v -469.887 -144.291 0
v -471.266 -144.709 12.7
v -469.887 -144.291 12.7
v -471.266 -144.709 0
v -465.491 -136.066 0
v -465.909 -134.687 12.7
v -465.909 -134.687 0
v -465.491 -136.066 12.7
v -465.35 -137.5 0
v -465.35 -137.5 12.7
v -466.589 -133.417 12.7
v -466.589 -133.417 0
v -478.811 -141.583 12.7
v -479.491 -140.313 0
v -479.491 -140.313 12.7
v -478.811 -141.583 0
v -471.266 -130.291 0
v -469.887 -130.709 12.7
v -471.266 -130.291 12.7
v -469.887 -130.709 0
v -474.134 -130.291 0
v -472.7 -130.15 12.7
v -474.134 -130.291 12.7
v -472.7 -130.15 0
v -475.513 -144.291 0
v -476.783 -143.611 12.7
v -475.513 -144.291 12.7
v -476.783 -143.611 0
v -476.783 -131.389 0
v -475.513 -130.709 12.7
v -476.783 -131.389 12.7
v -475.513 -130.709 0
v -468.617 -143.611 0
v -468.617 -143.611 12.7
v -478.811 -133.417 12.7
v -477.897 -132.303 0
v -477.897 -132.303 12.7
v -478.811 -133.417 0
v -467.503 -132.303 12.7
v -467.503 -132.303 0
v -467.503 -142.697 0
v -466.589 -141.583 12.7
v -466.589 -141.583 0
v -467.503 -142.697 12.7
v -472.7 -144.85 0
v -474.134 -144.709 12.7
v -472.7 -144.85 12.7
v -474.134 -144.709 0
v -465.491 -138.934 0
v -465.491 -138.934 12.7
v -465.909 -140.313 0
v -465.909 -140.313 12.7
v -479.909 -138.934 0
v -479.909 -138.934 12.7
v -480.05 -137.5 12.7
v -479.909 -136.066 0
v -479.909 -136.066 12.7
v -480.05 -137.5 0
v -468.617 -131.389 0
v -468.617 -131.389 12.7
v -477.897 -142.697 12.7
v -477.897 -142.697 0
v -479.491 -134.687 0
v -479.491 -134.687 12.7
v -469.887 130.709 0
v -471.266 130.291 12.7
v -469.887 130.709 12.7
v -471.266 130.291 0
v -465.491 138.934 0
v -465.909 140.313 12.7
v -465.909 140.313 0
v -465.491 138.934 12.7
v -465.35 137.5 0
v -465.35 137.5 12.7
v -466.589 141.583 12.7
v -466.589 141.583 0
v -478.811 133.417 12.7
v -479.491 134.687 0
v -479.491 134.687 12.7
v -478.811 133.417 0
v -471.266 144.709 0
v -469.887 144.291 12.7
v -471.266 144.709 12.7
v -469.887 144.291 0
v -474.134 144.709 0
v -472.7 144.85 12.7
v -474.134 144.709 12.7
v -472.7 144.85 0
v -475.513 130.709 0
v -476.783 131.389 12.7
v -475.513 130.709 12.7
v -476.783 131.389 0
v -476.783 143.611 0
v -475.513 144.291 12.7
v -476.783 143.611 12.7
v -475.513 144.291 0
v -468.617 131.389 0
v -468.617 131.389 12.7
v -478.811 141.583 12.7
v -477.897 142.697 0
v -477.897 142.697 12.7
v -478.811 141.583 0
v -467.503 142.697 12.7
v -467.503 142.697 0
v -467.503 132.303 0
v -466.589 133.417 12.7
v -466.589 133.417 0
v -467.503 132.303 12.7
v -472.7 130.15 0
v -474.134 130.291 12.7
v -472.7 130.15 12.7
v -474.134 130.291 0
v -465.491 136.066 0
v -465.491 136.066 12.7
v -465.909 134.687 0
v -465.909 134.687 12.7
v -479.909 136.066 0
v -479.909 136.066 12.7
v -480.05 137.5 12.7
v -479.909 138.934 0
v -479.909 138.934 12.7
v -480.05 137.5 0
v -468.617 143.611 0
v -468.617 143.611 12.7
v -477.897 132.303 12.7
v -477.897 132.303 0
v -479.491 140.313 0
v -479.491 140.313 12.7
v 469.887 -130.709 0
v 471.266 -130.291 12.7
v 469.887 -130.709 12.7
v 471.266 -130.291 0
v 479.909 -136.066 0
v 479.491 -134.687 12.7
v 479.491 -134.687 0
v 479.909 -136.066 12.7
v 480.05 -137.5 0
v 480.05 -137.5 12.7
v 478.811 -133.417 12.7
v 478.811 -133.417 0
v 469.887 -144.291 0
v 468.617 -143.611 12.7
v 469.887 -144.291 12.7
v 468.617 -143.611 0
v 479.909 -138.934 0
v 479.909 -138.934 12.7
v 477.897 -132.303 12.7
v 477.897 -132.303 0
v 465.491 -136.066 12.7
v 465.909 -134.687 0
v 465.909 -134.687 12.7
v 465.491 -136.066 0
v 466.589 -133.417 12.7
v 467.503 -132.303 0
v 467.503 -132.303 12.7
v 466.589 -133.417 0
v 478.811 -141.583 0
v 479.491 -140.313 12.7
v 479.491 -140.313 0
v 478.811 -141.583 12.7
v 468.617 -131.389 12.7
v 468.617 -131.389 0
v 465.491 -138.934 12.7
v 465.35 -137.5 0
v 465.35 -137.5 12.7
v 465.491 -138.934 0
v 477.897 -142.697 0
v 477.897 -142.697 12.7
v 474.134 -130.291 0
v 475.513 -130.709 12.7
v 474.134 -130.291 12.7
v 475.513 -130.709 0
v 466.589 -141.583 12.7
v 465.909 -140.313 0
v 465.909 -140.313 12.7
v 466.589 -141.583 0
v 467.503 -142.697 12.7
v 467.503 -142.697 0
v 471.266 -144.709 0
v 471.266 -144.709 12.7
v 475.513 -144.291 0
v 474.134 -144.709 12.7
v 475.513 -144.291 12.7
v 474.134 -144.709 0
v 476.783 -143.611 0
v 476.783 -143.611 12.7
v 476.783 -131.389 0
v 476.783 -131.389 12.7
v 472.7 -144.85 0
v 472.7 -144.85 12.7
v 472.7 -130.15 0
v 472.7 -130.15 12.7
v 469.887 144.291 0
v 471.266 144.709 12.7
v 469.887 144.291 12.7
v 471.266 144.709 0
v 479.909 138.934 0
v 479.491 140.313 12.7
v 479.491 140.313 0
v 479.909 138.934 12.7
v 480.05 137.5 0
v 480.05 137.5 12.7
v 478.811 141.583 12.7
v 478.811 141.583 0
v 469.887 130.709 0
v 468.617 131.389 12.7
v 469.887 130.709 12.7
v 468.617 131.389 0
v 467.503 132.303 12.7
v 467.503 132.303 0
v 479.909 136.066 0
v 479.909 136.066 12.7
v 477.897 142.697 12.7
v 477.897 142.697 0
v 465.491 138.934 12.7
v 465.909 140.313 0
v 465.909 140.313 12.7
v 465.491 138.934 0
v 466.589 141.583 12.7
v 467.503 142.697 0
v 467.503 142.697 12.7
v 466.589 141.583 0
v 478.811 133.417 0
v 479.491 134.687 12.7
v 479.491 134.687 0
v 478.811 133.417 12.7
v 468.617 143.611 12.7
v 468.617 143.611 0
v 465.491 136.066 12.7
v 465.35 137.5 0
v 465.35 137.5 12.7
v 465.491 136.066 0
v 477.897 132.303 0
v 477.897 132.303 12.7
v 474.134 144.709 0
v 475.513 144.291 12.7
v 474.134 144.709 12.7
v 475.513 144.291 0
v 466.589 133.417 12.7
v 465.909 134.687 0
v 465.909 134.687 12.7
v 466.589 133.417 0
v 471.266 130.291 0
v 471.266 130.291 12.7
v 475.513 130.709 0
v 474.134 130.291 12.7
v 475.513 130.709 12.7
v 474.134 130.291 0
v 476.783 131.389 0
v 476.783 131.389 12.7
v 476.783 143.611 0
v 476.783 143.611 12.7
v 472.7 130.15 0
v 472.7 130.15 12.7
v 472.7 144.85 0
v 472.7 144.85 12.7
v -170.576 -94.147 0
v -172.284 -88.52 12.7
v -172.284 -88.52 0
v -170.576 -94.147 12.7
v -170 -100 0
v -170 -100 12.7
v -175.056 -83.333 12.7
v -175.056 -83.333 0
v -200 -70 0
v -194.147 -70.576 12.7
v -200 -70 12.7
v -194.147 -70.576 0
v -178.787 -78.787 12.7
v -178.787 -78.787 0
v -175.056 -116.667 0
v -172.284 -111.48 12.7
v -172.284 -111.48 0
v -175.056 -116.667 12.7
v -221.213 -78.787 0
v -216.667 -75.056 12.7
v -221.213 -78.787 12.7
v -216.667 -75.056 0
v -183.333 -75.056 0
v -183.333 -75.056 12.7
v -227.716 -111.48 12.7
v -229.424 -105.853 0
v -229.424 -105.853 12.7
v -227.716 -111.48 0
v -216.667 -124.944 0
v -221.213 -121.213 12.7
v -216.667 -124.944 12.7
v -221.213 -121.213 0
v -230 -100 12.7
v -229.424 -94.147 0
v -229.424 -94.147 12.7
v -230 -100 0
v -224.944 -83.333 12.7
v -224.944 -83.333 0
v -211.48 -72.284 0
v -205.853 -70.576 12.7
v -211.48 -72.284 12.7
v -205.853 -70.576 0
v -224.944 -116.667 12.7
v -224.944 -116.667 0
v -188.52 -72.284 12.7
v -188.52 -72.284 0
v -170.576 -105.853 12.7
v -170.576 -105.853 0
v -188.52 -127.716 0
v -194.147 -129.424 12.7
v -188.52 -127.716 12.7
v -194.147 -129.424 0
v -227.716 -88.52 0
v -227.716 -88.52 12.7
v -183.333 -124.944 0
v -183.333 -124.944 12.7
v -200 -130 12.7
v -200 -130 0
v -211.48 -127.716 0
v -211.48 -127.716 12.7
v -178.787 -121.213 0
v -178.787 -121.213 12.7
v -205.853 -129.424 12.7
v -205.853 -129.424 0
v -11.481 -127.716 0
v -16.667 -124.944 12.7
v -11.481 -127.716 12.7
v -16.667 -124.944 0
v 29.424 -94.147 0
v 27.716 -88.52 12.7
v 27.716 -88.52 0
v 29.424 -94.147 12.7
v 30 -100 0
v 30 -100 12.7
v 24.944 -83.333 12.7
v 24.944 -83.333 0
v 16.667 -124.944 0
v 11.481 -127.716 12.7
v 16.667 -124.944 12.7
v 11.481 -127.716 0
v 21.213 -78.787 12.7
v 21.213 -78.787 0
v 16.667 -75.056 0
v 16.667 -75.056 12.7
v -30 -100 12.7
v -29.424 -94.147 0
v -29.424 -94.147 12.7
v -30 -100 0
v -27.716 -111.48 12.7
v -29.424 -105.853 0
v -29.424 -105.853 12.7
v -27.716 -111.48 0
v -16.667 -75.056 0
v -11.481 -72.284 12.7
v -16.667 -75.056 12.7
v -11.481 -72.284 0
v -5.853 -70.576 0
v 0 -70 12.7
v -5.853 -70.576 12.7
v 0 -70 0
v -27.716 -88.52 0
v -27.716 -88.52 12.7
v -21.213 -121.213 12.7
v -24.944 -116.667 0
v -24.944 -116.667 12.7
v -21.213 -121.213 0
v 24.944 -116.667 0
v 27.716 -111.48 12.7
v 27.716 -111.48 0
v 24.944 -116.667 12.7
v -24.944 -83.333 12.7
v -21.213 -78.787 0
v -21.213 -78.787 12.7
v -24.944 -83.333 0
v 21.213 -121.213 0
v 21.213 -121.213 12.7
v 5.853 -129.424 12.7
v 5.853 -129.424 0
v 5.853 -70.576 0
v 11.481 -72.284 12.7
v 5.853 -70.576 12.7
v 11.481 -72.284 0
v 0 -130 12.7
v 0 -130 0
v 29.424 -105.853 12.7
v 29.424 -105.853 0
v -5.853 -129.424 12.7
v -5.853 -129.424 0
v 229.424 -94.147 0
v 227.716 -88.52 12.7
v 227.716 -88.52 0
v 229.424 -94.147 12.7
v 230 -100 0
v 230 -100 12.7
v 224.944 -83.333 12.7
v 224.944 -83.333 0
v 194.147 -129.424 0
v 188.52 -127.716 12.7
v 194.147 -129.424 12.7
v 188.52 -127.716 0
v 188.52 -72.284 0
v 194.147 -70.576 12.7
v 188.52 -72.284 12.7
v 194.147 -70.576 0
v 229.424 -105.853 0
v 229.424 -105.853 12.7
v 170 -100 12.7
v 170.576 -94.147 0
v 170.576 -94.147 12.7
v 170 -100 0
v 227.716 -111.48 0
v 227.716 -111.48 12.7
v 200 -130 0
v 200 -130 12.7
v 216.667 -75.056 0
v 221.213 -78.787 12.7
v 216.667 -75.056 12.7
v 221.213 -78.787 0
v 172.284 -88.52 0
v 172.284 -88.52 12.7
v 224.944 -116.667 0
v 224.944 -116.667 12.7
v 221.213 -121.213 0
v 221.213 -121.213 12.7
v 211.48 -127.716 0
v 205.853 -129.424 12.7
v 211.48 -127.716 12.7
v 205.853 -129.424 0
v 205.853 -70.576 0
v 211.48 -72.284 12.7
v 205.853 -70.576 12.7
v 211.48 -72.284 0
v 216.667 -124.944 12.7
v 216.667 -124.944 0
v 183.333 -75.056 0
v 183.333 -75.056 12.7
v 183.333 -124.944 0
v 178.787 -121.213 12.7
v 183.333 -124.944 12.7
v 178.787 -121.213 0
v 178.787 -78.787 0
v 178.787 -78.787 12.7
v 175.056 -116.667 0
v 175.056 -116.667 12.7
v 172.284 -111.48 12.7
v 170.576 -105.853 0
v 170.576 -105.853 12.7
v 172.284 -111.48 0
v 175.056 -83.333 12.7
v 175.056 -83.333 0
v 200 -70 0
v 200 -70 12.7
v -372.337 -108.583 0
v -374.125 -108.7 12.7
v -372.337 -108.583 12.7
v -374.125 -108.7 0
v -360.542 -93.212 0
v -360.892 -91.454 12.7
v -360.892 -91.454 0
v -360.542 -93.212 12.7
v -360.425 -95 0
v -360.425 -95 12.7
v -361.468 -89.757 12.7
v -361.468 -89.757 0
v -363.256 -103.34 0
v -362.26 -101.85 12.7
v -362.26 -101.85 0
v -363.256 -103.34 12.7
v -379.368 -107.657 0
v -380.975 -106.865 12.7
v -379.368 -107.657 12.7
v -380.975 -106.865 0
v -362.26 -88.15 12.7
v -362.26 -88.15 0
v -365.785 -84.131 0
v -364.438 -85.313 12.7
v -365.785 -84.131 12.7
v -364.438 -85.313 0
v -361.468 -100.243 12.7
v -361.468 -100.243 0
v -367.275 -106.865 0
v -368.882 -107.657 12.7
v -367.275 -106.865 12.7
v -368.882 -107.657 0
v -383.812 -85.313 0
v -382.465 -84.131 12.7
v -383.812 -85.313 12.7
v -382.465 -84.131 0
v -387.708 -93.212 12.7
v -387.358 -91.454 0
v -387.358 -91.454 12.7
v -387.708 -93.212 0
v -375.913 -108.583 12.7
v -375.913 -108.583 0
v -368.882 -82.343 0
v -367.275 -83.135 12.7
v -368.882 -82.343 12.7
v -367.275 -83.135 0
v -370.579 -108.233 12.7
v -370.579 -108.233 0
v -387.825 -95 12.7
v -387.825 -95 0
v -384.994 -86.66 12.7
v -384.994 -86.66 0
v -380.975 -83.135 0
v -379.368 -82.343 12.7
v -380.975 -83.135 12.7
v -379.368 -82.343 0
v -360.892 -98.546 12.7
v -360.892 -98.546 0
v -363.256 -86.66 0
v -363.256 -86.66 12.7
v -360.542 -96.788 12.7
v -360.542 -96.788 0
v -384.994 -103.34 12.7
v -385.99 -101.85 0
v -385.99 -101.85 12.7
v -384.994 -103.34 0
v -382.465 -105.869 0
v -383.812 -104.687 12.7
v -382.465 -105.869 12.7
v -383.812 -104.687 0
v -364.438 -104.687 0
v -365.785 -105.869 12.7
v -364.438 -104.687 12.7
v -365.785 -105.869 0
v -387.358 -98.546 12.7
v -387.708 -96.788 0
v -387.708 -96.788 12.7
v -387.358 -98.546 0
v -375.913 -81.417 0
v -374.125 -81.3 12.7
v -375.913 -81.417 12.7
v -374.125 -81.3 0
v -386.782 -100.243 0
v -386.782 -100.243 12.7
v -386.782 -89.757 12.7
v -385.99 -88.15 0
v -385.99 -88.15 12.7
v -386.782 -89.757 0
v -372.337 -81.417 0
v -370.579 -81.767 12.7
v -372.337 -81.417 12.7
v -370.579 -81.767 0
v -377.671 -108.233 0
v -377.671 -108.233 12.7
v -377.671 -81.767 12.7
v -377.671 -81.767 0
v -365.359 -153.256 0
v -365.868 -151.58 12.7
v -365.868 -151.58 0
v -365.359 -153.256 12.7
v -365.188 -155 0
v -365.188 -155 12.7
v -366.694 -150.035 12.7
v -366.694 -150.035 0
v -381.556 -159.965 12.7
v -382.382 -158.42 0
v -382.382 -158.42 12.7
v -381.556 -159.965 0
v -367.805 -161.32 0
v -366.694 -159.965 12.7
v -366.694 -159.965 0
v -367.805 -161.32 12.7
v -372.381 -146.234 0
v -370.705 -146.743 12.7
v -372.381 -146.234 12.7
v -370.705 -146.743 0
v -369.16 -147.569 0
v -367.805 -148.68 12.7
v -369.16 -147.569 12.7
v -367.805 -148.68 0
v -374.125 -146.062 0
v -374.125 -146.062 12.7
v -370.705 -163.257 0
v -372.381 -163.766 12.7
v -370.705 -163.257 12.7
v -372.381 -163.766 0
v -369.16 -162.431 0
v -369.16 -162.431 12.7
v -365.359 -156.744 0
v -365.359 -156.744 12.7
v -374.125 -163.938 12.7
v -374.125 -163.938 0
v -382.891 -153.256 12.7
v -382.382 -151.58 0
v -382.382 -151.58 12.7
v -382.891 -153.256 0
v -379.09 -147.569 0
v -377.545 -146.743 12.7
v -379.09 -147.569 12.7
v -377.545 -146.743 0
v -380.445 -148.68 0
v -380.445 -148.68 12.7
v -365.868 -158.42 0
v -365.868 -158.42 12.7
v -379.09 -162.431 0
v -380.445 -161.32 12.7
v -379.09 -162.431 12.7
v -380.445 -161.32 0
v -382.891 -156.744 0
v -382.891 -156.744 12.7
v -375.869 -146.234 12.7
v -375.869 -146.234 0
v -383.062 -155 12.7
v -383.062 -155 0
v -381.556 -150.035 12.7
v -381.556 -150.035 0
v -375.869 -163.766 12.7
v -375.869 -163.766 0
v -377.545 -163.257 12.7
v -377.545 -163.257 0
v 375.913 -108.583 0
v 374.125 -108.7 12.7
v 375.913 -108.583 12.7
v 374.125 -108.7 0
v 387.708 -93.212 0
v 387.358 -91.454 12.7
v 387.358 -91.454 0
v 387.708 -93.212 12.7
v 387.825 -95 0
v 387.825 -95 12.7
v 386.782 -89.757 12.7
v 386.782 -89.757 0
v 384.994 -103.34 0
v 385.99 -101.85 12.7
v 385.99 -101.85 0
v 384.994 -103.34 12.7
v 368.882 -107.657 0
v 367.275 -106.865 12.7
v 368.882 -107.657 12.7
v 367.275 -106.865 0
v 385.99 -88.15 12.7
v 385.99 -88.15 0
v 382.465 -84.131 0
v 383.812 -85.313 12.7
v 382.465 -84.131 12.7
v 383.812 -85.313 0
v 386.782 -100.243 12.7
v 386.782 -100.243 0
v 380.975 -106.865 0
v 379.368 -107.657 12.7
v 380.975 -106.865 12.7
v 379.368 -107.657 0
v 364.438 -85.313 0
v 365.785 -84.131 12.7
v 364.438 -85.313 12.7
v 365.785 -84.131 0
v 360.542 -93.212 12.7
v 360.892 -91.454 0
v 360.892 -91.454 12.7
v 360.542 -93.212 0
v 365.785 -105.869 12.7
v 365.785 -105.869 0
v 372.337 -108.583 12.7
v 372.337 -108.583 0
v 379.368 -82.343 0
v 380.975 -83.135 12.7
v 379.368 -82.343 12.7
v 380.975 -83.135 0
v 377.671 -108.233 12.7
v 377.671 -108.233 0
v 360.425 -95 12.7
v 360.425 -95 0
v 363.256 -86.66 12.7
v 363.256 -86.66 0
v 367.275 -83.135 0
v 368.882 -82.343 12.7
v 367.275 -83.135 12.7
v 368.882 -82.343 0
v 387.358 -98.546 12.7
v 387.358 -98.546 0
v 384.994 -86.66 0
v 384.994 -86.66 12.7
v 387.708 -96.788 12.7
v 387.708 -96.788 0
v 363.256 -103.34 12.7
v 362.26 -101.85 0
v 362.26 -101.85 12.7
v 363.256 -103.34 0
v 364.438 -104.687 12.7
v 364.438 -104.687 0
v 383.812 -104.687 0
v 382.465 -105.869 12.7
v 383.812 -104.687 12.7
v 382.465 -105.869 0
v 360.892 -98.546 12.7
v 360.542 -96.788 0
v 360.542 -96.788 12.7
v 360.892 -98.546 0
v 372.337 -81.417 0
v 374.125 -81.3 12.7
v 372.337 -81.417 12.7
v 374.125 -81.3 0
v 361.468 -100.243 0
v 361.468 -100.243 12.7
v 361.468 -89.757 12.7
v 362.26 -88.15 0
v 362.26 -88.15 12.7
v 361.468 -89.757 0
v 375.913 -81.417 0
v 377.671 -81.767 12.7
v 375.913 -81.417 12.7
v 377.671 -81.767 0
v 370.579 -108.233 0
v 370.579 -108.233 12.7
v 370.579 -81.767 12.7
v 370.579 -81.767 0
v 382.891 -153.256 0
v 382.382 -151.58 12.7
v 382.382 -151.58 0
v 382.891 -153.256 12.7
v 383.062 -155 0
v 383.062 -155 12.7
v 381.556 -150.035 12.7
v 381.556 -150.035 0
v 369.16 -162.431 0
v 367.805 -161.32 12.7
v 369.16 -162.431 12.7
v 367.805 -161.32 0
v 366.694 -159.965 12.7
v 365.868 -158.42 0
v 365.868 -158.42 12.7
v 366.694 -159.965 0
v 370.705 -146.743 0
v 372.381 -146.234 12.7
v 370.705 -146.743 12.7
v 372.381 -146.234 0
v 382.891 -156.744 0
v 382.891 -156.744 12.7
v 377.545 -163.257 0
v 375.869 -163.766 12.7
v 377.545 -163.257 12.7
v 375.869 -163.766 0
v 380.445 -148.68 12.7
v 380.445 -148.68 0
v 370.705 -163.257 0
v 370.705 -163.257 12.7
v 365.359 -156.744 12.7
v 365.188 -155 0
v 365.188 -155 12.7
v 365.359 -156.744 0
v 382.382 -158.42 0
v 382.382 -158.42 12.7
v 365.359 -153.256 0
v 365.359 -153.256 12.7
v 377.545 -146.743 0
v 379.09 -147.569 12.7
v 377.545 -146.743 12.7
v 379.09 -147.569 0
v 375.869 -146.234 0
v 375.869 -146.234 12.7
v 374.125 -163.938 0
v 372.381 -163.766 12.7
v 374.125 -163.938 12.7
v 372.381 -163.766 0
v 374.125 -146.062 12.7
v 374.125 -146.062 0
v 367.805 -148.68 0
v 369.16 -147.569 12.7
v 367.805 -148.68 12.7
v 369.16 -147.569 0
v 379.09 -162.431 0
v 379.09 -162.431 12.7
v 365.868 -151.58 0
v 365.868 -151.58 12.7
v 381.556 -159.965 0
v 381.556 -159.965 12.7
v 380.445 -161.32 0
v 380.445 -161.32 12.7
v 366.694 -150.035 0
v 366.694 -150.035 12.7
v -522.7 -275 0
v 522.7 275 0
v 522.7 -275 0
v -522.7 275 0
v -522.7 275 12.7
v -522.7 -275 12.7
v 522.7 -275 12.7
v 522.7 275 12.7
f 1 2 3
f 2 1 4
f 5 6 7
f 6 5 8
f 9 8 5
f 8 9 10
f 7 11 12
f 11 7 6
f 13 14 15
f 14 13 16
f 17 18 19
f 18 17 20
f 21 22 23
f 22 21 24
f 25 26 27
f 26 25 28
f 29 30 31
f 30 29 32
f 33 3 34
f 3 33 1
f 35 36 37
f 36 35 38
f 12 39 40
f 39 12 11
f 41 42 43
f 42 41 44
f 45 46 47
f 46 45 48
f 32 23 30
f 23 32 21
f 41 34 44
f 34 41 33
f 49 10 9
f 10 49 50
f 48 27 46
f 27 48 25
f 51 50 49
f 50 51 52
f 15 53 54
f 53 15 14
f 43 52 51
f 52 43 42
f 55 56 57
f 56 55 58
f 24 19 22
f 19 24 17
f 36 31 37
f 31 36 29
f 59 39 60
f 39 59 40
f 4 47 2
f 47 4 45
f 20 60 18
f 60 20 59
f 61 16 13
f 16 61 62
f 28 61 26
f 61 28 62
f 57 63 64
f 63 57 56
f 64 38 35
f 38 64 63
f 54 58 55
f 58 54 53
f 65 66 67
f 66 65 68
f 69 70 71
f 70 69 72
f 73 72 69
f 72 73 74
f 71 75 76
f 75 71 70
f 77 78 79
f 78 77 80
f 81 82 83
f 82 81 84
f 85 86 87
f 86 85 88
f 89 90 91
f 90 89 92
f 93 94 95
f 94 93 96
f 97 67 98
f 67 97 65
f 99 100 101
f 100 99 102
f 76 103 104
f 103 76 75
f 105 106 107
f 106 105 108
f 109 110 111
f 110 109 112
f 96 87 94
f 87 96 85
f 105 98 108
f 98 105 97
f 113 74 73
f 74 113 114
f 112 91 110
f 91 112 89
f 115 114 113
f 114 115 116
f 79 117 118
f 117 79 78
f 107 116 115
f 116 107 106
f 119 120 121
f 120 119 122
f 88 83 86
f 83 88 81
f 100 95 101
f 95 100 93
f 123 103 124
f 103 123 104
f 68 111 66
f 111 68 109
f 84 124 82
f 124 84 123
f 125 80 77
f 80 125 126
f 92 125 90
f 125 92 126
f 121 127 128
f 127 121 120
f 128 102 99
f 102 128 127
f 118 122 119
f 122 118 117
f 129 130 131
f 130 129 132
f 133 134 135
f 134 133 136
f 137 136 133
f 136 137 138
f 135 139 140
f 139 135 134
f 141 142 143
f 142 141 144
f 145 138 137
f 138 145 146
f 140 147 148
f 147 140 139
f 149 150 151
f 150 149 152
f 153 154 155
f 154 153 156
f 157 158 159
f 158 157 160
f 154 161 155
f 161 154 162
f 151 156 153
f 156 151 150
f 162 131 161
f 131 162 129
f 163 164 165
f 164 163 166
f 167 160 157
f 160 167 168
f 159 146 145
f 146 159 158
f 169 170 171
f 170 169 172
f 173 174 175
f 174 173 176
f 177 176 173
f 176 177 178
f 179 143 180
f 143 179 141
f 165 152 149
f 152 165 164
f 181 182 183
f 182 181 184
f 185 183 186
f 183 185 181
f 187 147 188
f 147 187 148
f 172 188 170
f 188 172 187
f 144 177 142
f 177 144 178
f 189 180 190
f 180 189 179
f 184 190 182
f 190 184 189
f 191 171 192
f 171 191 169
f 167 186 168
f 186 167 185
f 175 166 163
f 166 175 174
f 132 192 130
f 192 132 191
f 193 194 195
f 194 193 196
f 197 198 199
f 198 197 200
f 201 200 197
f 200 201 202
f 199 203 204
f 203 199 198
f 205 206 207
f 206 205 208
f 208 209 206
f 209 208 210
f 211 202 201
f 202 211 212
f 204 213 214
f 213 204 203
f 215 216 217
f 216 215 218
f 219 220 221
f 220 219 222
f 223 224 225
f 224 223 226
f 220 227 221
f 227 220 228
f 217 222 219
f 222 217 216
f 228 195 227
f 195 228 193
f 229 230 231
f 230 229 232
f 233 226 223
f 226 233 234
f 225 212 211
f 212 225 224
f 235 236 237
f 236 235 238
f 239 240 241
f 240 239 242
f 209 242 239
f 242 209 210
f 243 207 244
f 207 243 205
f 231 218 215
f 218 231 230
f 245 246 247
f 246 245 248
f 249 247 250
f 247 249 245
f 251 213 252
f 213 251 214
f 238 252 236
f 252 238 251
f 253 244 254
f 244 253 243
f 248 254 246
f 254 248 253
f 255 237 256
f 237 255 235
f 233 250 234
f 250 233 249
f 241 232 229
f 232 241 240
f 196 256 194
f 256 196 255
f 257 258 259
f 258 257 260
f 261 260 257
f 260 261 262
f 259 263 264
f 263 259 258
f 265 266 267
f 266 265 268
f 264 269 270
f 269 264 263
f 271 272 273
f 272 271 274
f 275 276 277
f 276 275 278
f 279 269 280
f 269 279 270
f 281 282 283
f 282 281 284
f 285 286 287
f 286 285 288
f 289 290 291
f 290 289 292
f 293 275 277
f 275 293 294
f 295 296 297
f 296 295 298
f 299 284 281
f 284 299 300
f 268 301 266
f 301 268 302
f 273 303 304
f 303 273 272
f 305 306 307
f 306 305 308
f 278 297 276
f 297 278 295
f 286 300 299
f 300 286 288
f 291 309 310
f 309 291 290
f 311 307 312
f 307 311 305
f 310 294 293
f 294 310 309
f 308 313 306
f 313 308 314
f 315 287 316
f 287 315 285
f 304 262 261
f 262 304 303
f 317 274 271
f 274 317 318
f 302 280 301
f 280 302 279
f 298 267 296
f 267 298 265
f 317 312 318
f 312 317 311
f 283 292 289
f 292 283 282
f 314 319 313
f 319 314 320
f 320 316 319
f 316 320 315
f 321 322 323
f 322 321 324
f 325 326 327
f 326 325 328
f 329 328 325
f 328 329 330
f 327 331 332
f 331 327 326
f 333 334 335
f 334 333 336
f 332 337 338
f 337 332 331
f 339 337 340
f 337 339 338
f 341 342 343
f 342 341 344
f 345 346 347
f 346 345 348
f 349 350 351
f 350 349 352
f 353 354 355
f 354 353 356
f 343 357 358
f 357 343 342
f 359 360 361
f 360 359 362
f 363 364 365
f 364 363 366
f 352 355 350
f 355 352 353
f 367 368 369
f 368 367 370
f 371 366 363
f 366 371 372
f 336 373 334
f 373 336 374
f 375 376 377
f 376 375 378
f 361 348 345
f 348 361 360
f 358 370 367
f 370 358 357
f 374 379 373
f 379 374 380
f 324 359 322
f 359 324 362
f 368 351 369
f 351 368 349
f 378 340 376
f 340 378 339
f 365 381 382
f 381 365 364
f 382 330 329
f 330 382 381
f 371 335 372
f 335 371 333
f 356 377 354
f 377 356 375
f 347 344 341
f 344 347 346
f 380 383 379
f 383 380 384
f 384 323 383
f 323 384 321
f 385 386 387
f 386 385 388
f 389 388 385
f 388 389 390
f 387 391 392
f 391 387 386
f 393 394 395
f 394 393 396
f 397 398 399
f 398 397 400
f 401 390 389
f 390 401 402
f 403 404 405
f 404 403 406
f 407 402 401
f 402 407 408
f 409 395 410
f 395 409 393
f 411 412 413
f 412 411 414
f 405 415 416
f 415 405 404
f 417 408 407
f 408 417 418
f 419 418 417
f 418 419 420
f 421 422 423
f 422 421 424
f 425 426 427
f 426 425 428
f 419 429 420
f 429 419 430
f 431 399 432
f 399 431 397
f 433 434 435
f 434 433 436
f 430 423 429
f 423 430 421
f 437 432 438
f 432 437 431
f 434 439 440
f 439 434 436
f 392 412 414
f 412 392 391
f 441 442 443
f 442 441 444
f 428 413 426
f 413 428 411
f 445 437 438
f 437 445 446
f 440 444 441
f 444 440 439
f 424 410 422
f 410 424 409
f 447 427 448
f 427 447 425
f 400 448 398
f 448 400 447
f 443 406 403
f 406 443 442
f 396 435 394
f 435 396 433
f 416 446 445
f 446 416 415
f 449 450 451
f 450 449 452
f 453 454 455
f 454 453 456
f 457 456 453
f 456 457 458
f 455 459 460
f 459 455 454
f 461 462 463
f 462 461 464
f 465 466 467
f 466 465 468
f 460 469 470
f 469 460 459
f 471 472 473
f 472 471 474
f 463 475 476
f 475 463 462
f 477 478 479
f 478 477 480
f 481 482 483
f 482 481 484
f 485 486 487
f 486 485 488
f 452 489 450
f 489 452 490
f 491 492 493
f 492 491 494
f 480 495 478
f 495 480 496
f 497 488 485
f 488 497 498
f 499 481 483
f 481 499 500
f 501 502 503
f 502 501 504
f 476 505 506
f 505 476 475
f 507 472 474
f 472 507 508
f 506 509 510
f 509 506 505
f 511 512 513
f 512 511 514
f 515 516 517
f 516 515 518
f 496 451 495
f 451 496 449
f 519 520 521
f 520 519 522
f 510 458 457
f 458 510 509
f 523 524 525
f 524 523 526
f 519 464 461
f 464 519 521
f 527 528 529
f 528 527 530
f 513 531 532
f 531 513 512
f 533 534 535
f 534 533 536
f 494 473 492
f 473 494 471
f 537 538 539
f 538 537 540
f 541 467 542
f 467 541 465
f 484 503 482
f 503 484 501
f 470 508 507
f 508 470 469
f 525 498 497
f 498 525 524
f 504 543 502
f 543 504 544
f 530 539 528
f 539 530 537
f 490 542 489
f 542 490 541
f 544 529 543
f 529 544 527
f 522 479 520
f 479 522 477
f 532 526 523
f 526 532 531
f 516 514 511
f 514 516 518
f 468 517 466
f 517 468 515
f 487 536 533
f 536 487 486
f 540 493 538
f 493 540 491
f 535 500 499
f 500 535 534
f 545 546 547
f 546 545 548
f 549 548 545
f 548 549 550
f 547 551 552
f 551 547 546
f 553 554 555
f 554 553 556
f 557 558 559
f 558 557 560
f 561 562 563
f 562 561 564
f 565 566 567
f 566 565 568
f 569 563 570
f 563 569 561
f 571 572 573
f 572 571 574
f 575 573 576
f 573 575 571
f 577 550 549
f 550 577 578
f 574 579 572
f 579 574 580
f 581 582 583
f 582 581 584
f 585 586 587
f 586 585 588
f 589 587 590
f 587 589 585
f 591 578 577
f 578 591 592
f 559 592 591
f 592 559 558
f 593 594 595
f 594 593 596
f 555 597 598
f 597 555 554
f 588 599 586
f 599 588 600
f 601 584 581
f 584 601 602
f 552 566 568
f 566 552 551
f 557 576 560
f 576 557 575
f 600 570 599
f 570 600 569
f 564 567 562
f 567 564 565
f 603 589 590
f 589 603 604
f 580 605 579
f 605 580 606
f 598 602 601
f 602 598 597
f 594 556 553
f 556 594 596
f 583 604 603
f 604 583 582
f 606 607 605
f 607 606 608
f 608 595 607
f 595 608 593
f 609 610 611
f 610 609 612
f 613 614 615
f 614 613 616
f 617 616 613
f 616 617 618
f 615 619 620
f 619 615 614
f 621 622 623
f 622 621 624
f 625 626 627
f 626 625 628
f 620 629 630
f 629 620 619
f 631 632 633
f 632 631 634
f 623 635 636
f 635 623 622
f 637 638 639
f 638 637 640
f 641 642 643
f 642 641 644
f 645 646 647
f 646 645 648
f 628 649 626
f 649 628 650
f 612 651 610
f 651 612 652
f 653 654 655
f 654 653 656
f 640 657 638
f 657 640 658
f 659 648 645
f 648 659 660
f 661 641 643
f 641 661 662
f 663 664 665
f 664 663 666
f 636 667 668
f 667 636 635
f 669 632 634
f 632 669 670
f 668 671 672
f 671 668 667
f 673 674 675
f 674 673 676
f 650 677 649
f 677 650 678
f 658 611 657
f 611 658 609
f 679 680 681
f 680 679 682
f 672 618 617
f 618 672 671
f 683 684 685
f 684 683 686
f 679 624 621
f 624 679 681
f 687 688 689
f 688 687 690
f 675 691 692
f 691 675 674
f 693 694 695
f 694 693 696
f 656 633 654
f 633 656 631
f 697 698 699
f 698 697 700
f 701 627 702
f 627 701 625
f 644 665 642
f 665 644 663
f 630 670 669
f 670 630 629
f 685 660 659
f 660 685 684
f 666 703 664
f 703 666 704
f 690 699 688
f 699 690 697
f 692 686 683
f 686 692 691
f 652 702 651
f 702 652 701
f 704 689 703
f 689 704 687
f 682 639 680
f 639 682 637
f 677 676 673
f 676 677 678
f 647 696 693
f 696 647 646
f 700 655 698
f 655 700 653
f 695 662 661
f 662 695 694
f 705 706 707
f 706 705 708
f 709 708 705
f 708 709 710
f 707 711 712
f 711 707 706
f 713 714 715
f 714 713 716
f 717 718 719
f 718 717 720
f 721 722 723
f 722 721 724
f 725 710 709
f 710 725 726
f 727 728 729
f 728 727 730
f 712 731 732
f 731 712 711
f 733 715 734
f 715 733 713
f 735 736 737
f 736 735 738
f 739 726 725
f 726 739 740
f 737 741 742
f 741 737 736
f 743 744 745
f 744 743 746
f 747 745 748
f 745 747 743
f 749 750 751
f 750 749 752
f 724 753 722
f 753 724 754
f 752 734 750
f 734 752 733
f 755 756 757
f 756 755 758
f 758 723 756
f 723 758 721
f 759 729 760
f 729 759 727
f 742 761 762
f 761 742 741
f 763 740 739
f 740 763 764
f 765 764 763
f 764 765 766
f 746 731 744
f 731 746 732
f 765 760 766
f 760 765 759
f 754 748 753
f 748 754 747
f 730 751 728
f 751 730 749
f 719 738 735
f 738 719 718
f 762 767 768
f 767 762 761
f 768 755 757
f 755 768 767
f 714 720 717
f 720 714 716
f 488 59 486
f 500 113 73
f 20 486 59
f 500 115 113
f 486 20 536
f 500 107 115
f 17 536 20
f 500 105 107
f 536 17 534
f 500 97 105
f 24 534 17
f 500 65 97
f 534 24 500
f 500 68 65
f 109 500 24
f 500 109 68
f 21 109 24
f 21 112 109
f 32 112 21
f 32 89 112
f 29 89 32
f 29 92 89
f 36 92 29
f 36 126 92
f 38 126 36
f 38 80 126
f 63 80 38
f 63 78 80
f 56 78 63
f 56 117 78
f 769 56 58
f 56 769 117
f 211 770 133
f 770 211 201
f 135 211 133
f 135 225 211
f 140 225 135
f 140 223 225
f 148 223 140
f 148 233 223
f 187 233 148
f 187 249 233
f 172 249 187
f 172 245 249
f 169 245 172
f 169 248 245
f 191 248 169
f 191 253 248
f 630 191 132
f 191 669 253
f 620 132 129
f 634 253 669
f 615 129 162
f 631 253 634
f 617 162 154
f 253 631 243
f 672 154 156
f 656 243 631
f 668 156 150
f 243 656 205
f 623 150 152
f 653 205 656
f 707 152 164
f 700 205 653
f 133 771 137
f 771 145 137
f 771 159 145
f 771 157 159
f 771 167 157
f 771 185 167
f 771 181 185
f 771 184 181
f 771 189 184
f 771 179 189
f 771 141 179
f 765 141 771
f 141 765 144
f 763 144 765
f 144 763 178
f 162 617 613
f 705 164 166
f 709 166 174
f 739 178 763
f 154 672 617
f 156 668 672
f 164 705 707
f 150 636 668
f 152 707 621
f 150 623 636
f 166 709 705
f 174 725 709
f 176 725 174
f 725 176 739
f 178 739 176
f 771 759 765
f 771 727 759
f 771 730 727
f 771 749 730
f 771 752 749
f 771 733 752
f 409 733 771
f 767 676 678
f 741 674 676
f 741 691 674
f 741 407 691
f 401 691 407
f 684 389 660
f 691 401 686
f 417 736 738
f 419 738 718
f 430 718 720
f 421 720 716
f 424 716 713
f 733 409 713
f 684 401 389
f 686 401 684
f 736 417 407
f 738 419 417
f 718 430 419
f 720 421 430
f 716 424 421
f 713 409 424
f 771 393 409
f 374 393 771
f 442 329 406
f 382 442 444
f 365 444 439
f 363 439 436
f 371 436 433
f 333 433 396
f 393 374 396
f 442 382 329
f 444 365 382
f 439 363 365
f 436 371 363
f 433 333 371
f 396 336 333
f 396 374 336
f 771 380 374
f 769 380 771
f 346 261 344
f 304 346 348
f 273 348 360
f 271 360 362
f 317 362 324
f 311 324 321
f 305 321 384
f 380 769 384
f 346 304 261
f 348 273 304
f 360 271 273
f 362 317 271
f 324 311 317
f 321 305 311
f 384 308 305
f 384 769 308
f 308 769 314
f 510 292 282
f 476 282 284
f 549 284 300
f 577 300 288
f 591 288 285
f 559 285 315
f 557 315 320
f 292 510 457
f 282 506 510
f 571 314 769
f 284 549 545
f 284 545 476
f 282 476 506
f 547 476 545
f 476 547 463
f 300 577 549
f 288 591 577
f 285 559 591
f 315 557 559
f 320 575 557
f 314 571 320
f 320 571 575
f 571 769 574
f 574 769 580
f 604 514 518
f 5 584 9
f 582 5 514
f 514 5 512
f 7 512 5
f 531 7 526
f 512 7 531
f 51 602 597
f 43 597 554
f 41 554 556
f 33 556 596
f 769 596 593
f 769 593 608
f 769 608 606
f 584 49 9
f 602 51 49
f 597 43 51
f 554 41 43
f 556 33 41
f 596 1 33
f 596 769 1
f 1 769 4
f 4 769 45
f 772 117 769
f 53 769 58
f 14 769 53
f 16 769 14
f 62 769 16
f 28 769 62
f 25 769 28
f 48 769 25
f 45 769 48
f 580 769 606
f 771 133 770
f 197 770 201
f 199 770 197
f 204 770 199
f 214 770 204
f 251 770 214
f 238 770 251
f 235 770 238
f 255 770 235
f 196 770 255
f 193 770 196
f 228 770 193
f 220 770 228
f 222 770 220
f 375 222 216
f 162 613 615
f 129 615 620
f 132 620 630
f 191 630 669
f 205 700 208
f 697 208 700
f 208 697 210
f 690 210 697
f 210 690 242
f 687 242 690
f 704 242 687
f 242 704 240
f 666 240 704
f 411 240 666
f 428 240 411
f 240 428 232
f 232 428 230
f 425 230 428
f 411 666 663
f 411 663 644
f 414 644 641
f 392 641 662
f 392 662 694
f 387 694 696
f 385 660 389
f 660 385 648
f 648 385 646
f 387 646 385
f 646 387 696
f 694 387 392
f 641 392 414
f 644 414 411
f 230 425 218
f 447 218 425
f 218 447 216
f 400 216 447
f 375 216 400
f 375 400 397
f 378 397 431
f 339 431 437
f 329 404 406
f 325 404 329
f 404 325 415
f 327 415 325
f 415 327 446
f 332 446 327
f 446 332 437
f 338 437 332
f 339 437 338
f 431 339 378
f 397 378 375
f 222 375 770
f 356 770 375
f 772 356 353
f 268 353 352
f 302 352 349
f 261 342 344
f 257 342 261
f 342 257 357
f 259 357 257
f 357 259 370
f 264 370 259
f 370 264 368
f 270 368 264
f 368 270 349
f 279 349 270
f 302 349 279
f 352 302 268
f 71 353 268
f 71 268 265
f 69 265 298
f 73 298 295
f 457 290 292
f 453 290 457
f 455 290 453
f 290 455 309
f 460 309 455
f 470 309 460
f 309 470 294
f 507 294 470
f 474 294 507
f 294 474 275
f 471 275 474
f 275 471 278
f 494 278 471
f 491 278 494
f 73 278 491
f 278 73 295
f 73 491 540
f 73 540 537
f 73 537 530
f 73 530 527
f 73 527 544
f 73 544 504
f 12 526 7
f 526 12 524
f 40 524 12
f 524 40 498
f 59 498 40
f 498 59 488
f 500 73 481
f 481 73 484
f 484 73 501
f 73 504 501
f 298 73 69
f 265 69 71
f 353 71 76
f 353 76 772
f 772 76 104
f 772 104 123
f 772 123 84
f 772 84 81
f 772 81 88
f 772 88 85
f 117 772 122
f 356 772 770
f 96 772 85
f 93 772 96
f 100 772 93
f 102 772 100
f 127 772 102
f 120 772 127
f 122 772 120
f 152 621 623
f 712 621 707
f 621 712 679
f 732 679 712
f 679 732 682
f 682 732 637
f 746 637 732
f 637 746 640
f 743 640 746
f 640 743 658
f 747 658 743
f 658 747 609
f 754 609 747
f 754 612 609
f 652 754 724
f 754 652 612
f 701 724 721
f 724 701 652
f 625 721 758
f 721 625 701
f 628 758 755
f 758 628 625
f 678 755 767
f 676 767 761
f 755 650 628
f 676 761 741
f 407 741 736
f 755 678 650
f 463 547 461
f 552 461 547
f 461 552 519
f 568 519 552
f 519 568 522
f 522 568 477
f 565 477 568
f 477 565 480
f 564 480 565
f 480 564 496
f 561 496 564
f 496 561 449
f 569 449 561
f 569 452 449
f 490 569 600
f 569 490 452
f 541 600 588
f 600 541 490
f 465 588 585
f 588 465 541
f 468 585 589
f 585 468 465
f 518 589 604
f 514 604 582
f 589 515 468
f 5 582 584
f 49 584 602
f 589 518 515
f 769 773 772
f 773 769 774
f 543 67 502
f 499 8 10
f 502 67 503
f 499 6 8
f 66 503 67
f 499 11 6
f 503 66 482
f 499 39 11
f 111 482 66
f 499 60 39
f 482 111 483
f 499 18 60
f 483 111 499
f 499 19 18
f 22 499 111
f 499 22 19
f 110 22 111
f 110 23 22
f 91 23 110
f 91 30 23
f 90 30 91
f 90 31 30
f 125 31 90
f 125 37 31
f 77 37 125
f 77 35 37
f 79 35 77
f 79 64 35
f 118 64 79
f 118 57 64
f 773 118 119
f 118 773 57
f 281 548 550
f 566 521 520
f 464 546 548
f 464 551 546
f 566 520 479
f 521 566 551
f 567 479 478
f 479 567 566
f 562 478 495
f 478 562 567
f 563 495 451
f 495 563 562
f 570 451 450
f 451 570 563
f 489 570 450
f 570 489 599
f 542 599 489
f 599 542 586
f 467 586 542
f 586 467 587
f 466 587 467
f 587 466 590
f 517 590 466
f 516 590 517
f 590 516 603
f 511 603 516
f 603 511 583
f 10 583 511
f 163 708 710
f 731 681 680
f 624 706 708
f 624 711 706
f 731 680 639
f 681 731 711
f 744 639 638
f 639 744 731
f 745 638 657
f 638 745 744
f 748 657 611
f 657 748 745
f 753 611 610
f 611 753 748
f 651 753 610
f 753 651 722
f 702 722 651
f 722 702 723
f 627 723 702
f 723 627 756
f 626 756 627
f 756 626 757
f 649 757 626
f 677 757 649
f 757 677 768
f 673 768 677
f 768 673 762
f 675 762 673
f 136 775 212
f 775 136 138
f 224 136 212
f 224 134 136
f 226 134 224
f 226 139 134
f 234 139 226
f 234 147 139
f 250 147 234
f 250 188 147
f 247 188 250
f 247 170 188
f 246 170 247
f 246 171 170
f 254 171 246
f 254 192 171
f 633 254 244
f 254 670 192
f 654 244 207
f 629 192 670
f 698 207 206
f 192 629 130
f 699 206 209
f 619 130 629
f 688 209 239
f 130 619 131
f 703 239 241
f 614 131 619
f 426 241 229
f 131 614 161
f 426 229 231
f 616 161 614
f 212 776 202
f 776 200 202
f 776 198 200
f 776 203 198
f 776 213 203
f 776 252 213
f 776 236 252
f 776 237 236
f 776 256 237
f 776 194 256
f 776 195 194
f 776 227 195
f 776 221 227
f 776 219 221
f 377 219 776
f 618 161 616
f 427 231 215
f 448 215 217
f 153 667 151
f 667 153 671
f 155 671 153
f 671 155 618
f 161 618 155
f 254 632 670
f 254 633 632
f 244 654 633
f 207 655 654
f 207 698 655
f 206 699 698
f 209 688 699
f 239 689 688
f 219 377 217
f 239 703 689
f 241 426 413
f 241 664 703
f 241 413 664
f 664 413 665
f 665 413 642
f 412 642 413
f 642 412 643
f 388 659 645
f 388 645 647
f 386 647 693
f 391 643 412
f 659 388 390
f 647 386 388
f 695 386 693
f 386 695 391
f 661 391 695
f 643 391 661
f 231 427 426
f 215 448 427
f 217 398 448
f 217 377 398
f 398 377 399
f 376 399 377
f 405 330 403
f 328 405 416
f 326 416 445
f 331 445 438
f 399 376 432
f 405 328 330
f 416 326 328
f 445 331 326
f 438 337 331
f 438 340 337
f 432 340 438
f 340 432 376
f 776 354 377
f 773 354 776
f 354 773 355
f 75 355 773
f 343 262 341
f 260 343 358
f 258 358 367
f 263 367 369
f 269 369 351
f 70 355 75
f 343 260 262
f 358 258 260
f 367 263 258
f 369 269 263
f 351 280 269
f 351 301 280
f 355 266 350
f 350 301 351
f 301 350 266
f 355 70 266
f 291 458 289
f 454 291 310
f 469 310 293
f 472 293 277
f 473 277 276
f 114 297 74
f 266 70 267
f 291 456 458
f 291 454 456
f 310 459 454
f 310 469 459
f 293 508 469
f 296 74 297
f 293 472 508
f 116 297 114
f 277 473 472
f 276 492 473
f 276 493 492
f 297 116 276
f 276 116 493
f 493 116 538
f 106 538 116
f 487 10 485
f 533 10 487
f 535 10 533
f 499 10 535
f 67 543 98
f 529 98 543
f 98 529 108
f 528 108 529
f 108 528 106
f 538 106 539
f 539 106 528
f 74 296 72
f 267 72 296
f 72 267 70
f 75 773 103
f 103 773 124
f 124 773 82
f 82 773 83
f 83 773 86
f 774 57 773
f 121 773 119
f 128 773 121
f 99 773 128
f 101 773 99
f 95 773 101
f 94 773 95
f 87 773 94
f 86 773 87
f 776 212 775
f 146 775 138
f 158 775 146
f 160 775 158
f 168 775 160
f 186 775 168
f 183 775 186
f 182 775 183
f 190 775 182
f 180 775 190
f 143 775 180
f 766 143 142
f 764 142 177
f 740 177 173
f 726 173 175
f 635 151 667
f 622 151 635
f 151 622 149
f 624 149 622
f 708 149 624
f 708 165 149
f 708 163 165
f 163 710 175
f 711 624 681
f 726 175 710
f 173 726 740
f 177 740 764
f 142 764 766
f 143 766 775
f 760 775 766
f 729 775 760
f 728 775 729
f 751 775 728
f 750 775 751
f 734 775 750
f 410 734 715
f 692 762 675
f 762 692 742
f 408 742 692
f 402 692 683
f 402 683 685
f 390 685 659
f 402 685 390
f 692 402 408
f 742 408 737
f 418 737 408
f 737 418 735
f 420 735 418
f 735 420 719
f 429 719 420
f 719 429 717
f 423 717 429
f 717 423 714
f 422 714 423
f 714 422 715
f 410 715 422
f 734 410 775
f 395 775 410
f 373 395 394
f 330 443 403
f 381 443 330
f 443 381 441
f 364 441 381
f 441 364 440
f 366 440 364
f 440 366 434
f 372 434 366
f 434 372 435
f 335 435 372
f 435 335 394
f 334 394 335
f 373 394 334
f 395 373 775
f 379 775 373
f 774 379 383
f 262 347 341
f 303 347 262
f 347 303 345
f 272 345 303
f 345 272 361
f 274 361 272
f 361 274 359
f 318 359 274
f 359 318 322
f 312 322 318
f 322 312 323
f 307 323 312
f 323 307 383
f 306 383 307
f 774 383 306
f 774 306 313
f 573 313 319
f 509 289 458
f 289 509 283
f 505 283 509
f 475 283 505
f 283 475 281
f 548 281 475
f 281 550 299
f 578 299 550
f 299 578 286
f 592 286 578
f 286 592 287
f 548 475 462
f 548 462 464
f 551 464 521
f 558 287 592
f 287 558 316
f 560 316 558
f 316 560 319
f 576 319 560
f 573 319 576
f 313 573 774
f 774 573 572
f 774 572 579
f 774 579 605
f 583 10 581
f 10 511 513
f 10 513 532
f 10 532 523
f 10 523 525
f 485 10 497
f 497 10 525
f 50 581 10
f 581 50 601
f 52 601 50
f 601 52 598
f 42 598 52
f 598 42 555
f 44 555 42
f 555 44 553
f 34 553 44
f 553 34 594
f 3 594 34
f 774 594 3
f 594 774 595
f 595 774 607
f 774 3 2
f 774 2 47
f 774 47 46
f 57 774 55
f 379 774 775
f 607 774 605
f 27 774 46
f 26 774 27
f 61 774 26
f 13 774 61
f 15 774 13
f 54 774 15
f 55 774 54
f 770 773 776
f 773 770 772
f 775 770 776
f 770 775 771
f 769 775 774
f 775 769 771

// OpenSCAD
// rear_crossmember.scad
// Rear crossmember plate for LifeTrac v25
// Connects left and right side panels at the rear
// Includes pivot holes and lock pin holes for folding platform

include <../lifetrac_v25_params.scad>

module rear_crossmember() {
    back_height = MACHINE_HEIGHT * 0.55;
    crossmember_width = TRACK_WIDTH + SANDWICH_SPACING + PANEL_THICKNESS * 2;
    plate_thickness = PANEL_THICKNESS;

    // Folding platform pivot mounting calculations
    // Y coordinate in crossmember local coords (centered square, so offset from center)
    // Pivot Z in world = PLATFORM_PIVOT_HEIGHT, crossmember bottom Z = FRAME_Z_OFFSET
    // Crossmember is centered, so local Y = world_Z - (FRAME_Z_OFFSET + back_height/2)
    pivot_local_y = PLATFORM_PIVOT_HEIGHT - FRAME_Z_OFFSET - back_height/2;
    
    // Deployed lock hole position (below pivot)
    deployed_lock_y = pivot_local_y - PLATFORM_LOCK_OFFSET;
    
    // Stowed lock hole position (above pivot, at arm length distance)
    stowed_lock_y = pivot_local_y + PLATFORM_ARM_LENGTH;

    // Lay the plate flat in XY so projection captures all features
    difference() {
        // Main plate
        linear_extrude(height=plate_thickness)
        square([crossmember_width, back_height], center=true);

        // Bolt holes for mounting to side panels (4 per side)
        for (side = [-1, 1]) {
            x_pos = side * (crossmember_width/2 - 50);
            for (z_pos = [back_height/4, back_height * 3/4]) {
                y_pos = z_pos - back_height/2; // shift because square is centered
                translate([x_pos, y_pos, plate_thickness/2])
                cylinder(d=BOLT_DIA_1_2 + 2, h=plate_thickness+4, center=true, $fn=32);
            }
        }

        // Lightening holes to reduce weight
        for (x = [-200, 0, 200]) {
            y_pos = (back_height/2 - 100) - back_height/2; // place 100mm below top edge
            translate([x, y_pos, plate_thickness/2])
            cylinder(d=60, h=plate_thickness+4, center=true, $fn=32);
        }
        
        // =================================================================
        // FOLDING PLATFORM MOUNTING HOLES
        // =================================================================
        
        // Pivot pin holes (1" diameter + clearance) - one on each side
        for (side = [-1, 1]) {
            pivot_x = side * PLATFORM_PIVOT_X;
            
            // Main pivot hole
            translate([pivot_x, pivot_local_y, plate_thickness/2])
            cylinder(d=PLATFORM_PIVOT_PIN_DIA + PLATFORM_BOLT_CLEARANCE, 
                     h=plate_thickness + 4, 
                     center=true, 
                     $fn=48);
            
            // Deployed position lock pin hole (3/8" + clearance)
            // Located below pivot when platform is horizontal
            translate([pivot_x, deployed_lock_y, plate_thickness/2])
            cylinder(d=PLATFORM_LOCK_PIN_DIA + PLATFORM_BOLT_CLEARANCE, 
                     h=plate_thickness + 4, 
                     center=true, 
                     $fn=32);
            
            // Stowed position lock pin hole (3/8" + clearance)
            // Located above pivot when platform is vertical against crossmember
            // Only add if within crossmember bounds
            if (stowed_lock_y < back_height/2 - 20) {
                translate([pivot_x, stowed_lock_y, plate_thickness/2])
                cylinder(d=PLATFORM_LOCK_PIN_DIA + PLATFORM_BOLT_CLEARANCE, 
                         h=plate_thickness + 4, 
                         center=true, 
                         $fn=32);
            }
        }
    }
}

// Render the part for preview/export
if ($preview || len(search("rear_crossmember.scad", parent_modules())) == 0) {
    rear_crossmember();
}
